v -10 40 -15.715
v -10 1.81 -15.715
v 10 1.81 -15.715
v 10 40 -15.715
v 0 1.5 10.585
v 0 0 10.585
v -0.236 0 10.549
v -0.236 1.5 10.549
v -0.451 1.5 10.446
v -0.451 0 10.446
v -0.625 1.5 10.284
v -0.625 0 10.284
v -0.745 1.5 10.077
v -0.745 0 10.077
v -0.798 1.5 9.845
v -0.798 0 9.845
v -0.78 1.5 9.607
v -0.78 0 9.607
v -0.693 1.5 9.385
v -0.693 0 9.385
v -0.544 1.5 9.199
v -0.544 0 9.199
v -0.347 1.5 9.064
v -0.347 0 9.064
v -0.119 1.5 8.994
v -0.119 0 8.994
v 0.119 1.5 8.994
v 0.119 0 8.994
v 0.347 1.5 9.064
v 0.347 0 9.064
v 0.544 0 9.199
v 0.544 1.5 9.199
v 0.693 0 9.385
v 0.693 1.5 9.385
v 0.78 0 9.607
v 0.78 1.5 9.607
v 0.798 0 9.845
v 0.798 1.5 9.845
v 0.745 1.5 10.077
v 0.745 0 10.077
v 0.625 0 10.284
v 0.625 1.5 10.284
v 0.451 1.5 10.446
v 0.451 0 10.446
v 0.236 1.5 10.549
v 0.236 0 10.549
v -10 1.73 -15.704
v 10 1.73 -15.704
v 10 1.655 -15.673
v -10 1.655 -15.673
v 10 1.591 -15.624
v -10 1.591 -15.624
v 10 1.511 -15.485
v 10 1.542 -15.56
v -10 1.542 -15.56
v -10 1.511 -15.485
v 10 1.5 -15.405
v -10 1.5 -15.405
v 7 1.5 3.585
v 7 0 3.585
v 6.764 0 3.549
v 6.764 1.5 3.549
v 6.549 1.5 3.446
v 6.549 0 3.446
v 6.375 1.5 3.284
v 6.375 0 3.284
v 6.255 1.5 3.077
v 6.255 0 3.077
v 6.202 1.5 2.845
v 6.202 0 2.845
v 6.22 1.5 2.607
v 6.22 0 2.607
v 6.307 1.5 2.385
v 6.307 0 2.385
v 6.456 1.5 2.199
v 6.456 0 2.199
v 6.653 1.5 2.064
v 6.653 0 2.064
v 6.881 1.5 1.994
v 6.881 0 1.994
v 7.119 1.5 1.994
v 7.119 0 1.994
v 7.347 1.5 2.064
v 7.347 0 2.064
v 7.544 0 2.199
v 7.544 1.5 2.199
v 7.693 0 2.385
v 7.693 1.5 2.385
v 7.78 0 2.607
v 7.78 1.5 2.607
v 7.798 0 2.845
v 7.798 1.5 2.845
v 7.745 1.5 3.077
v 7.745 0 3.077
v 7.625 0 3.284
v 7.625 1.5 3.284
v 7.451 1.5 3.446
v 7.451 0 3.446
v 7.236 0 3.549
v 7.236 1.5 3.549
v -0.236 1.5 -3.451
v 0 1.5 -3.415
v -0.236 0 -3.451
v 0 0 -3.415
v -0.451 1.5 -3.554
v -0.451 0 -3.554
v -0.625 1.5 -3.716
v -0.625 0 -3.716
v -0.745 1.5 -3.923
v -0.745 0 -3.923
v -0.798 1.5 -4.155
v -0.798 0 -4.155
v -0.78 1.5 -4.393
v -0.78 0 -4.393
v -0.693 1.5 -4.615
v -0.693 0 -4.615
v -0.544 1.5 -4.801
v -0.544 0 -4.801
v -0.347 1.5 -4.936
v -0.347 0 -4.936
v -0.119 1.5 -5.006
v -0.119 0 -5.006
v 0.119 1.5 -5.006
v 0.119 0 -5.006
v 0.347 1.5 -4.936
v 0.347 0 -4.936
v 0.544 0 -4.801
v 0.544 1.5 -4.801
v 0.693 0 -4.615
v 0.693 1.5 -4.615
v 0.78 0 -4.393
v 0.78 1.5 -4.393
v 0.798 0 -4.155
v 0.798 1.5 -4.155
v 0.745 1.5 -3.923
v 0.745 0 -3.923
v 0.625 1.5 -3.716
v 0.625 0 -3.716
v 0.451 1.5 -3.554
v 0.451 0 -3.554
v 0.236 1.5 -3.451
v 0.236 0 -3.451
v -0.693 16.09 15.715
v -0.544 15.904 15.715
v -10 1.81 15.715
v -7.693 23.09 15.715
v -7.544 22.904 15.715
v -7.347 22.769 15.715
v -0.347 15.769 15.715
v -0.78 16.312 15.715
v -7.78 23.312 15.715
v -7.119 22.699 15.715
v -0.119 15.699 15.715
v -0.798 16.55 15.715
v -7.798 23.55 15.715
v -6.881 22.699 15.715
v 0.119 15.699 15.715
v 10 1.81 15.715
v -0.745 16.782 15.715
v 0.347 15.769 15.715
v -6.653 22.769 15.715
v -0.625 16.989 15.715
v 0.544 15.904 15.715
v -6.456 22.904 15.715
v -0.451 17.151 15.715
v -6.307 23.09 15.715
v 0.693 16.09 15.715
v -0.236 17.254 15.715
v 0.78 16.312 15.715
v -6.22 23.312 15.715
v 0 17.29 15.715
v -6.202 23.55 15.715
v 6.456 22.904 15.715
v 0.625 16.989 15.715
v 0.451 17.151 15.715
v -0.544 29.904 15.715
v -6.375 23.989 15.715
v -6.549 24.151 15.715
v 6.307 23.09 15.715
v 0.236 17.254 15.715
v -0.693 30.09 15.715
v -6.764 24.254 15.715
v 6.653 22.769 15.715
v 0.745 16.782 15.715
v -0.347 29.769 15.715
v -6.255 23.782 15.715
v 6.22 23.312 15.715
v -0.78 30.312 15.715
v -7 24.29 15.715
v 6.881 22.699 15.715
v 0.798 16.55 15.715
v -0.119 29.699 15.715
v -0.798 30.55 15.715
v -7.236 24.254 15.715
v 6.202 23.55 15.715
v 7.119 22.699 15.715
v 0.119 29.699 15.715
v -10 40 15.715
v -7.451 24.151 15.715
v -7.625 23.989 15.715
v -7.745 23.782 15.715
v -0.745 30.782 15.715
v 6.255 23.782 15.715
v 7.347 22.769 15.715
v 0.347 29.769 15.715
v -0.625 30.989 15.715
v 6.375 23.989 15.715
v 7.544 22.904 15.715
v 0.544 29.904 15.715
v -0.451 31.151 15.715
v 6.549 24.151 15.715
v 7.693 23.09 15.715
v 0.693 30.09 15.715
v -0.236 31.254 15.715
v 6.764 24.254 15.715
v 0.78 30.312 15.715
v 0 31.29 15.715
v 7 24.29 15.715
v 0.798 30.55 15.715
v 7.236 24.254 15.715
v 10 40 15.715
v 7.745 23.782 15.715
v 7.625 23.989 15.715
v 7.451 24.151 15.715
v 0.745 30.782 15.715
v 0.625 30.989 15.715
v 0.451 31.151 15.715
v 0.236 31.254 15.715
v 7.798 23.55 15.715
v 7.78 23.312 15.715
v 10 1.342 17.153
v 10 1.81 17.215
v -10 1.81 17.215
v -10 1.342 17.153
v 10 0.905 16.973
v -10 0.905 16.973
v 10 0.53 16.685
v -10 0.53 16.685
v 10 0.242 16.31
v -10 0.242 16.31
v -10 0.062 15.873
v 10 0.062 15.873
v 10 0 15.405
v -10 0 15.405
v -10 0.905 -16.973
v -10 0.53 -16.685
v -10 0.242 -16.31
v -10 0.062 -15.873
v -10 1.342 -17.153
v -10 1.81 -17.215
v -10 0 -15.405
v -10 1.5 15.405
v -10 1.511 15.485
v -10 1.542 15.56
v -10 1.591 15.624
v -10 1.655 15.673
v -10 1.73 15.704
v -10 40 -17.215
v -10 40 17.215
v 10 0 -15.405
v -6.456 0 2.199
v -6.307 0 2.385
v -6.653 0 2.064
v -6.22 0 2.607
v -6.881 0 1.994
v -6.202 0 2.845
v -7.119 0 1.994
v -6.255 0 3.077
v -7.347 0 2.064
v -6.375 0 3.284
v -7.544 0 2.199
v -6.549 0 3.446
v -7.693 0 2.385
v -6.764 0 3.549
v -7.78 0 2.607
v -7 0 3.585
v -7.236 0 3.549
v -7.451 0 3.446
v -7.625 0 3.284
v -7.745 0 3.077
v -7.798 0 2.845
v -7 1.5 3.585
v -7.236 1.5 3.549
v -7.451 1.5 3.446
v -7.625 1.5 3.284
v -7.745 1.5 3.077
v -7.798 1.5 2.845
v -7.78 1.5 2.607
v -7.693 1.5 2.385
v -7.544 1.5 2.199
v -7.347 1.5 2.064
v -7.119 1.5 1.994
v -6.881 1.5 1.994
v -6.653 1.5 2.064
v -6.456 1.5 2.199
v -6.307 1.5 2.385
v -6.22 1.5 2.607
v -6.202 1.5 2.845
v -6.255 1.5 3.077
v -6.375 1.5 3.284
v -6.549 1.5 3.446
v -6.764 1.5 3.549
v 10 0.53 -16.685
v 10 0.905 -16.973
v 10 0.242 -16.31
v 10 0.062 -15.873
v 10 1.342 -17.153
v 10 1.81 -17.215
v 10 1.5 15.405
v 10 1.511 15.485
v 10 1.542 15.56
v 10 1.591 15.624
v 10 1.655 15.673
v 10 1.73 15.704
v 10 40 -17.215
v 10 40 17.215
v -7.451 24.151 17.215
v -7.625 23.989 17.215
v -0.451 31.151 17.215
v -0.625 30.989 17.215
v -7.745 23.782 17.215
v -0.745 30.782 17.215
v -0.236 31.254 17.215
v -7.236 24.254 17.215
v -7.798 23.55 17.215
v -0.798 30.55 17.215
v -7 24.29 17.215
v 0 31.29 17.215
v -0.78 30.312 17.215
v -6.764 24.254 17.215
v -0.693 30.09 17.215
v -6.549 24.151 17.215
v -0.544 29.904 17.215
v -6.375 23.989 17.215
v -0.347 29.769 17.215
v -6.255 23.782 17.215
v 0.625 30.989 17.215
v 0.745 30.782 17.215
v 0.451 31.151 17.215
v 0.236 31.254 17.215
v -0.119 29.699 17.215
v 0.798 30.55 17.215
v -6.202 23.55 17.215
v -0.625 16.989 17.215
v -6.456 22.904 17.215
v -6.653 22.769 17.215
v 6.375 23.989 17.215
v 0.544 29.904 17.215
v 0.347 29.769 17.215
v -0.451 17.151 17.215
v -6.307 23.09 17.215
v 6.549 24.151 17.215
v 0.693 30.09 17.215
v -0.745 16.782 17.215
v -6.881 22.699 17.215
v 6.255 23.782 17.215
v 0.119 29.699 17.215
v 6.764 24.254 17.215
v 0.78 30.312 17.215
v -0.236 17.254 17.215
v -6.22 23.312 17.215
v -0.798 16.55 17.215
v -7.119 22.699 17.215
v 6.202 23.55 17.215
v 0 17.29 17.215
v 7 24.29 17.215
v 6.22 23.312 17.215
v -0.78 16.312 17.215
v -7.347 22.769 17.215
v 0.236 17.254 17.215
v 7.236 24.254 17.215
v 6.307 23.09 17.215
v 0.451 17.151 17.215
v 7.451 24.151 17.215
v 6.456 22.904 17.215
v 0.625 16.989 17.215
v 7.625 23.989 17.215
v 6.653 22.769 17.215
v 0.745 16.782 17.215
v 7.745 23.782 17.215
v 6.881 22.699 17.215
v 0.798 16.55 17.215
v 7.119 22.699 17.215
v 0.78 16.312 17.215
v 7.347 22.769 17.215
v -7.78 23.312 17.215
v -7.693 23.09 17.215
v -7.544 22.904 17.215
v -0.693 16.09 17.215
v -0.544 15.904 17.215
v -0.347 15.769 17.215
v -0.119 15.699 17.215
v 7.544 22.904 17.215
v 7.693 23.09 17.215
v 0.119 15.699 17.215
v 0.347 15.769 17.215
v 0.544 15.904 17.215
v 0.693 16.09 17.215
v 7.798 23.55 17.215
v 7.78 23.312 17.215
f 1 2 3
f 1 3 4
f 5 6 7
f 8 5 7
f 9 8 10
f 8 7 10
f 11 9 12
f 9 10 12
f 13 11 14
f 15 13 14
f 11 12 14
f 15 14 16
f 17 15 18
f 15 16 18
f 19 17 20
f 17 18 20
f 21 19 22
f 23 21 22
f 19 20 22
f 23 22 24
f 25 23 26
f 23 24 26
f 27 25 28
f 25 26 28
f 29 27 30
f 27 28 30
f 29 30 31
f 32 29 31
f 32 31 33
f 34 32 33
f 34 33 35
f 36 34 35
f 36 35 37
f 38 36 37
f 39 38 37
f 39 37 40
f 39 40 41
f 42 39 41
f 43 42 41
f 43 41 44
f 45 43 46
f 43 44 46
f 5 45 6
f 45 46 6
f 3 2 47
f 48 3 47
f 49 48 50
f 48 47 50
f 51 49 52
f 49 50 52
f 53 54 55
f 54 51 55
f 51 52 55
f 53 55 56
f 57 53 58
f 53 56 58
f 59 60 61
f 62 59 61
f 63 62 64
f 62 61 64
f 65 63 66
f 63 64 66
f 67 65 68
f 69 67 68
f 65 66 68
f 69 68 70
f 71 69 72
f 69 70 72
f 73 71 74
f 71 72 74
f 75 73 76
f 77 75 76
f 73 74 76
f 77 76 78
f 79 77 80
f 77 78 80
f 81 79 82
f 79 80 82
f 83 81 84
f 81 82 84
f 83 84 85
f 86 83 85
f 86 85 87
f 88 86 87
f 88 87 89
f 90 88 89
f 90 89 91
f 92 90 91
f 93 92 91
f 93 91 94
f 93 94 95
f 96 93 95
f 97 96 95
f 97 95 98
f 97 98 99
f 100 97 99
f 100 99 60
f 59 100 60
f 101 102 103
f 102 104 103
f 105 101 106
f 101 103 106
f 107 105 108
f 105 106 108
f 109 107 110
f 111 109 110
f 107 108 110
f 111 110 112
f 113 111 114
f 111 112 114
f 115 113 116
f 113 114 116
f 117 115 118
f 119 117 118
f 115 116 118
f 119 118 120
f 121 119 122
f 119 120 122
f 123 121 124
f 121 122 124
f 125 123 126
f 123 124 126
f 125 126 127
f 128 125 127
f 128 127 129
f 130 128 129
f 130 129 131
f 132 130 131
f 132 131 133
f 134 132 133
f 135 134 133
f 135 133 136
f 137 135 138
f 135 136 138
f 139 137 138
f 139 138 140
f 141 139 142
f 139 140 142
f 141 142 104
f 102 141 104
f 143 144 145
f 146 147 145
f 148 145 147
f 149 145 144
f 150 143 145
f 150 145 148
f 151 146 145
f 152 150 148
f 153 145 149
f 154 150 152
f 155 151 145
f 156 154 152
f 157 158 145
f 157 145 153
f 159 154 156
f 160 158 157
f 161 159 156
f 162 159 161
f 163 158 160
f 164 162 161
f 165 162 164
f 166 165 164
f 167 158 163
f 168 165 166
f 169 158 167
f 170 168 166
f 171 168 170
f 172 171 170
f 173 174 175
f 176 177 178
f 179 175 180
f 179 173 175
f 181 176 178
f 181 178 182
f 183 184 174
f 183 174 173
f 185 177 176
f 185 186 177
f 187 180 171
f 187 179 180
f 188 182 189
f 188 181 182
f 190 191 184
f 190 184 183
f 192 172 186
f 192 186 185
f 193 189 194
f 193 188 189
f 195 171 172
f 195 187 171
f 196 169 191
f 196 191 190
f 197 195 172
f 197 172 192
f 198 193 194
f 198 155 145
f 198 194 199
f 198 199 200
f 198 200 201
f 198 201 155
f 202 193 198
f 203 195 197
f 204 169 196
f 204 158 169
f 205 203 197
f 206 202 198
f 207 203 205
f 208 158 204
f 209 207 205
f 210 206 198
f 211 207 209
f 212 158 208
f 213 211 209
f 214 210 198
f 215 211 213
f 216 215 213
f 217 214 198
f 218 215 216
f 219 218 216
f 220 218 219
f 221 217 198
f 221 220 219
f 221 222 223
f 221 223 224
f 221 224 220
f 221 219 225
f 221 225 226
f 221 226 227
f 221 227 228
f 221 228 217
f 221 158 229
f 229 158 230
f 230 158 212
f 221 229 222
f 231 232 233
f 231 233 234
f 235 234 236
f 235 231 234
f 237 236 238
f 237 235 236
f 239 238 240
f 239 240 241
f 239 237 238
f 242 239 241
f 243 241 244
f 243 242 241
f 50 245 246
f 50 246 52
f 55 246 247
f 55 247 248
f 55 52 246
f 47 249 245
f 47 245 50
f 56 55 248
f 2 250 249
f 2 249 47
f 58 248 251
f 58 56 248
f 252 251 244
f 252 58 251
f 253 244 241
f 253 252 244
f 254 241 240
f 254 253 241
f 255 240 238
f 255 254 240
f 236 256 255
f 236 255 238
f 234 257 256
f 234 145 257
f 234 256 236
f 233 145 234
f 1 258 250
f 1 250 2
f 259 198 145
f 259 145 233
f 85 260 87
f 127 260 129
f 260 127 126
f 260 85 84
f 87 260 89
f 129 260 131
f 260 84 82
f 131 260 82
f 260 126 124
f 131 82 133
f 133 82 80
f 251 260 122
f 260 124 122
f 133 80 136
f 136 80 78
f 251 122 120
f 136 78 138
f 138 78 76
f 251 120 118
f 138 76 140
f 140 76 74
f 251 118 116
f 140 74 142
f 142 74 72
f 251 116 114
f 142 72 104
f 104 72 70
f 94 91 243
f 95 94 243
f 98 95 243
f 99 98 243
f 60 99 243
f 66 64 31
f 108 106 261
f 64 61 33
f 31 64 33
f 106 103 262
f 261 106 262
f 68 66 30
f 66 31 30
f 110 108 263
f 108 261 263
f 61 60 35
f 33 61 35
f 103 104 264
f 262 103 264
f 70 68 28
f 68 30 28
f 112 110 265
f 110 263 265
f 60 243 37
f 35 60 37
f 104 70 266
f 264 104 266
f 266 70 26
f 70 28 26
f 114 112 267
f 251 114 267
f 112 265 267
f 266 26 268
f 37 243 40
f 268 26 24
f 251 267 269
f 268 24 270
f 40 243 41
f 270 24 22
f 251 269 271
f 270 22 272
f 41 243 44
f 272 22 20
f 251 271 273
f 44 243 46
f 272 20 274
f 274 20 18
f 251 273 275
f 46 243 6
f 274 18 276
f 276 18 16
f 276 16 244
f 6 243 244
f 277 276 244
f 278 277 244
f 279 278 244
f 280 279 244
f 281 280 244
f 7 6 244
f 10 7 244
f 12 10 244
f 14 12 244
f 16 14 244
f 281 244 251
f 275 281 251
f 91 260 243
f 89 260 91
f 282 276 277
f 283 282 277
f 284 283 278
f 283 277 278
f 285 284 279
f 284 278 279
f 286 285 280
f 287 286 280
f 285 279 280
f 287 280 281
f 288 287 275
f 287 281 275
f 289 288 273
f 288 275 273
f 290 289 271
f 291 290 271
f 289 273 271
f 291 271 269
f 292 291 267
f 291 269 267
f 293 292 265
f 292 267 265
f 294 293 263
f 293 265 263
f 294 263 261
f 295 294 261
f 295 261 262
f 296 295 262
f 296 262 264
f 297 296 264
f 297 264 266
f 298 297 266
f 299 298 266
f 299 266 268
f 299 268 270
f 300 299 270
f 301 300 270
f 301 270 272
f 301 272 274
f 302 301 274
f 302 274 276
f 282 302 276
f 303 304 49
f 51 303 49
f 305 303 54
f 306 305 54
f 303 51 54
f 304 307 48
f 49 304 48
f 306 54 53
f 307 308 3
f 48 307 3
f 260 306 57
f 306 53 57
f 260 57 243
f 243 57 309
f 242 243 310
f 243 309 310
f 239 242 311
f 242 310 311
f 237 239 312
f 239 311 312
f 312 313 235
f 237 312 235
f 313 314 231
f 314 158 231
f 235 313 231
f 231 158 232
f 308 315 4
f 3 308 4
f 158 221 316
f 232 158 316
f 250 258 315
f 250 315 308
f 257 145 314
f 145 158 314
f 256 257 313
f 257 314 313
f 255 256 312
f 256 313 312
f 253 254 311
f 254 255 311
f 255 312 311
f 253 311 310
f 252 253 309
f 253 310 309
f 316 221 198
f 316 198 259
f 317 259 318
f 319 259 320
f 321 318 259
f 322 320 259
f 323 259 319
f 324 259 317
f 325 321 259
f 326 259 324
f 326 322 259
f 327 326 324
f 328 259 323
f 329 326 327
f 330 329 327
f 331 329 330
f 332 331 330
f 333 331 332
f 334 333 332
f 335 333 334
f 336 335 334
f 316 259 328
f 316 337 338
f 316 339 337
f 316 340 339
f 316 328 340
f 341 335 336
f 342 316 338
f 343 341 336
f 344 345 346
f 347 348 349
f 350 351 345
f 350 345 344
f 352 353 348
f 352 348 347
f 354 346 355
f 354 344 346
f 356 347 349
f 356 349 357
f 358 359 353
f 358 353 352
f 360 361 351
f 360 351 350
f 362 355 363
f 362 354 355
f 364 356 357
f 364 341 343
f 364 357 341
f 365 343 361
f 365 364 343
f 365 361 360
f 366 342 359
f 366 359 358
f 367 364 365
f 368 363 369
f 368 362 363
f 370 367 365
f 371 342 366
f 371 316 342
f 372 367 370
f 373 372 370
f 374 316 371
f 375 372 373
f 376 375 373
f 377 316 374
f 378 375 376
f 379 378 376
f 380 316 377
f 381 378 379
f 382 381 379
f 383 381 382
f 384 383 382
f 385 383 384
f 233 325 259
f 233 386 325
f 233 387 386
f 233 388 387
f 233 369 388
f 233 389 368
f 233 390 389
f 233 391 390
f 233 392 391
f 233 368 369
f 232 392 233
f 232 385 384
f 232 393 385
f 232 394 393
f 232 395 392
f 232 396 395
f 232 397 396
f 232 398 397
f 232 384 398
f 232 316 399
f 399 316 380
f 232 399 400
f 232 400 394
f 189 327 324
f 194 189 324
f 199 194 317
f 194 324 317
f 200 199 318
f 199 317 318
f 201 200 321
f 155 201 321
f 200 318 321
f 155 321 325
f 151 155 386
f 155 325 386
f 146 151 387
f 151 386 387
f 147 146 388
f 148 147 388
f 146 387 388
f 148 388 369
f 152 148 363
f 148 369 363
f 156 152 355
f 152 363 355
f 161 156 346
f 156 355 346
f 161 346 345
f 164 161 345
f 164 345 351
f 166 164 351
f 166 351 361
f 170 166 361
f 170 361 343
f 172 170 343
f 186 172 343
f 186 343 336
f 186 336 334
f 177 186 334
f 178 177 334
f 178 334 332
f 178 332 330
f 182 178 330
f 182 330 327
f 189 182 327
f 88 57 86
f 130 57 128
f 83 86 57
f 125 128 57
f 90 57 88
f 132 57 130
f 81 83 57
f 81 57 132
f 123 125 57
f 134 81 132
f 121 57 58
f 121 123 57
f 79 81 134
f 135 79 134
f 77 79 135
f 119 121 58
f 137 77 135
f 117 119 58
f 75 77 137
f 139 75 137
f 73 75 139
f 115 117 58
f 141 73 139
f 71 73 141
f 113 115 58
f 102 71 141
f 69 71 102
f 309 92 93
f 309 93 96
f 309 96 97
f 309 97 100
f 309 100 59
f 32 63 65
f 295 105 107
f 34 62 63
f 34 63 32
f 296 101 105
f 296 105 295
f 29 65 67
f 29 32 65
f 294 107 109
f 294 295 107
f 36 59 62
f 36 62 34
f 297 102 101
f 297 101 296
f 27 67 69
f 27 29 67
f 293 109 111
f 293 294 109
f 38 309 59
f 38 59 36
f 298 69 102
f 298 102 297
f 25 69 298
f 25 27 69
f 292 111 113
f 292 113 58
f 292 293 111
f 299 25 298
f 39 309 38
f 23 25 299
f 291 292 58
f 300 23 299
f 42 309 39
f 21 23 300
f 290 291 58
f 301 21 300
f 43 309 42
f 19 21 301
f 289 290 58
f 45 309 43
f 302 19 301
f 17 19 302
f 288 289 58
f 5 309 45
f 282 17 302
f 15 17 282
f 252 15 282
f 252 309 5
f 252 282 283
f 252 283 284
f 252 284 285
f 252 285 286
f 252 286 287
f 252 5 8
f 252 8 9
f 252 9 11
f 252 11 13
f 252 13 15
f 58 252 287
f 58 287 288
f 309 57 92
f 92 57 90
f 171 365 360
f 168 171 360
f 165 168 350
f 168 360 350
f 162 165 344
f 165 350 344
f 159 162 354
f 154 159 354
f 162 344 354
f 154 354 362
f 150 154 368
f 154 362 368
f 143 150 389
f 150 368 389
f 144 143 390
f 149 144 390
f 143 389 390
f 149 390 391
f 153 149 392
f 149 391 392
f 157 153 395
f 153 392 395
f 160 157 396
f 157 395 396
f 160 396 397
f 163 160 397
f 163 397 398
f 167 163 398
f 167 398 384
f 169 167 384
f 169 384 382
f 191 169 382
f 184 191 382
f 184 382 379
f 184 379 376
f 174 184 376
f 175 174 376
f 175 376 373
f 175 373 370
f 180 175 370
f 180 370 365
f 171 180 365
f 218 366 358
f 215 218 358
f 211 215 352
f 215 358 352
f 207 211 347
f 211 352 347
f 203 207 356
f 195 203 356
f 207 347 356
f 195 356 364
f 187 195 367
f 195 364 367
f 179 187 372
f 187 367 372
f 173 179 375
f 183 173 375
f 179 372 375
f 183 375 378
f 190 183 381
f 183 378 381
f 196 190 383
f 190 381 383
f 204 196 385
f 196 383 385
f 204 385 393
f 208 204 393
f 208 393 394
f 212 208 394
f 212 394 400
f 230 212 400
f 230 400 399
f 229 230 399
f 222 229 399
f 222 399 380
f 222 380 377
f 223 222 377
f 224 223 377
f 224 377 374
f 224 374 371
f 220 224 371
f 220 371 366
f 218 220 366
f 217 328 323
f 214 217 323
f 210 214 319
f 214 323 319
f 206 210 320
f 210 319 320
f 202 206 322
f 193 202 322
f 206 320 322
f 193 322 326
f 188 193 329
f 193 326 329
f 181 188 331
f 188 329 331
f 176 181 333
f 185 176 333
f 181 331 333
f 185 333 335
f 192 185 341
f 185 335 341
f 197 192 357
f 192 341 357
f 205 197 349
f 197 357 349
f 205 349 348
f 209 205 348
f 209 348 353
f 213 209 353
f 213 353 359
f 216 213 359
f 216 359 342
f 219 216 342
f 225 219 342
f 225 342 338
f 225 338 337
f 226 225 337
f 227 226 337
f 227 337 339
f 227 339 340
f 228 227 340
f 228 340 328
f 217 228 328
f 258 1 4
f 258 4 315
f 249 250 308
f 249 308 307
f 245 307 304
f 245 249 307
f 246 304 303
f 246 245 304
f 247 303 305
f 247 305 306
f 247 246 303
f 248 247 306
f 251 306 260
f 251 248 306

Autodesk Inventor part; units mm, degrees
ref_plane "YZ Plane" through (0, 0, 0) normal (1, 0, 0) x (0, 1, 0)
ref_plane "XZ Plane" through (0, 0, 0) normal (0, 1, 0) x (-1, 0, 0)
ref_plane "XY Plane" through (0, 0, 0) normal (0, 0, 1) x (1, 0, 0)
sketch "Sketch1" plane through (0, 0, 0) normal (0, 1, 0) x (-1, 0, 0)
  line L0 (10, -15.715) -> (-10, -15.715)
  line L1 (-10, -15.715) -> (-10, 15.715)
  line L2 (-10, 15.715) -> (10, 15.715)
  line L3 (10, 15.715) -> (10, -15.715)
  point P0 (0, 0)
  dimension "d0" = 20
  dimension "d1" = 31.43
  dimension "d2" = 10
  dimension "d3" = 15.715
extrude "Plate1" add sketch "Sketch1" along normal blind 1.5
sketch "Sketch2" plane through (10, 0, 17.215) normal (0, 0, -1) x (-1, 0, 0)
  line L0 (20, 0) -> (0, 0)
  line L1 (0, 0) -> (0, 40)
  line L2 (0, 40) -> (20, 40)
  line L3 (20, 40) -> (20, 0)
edge flange "Flange1" height 40 angle 90 thickness 1.5 bend radius 0.31 thickness toward (0, 0, -1) relief tear relief width 1.5 relief depth 0.75 edges at (0, 1.5, 15.715) wall of the first edge with corners at (-10, 0, 17.215) (10, 0, 17.215) (10, 40, 17.215) (-10, 40, 17.215)
bend "Bend1"
corner "Corner1"
sketch "Sketch3" plane through (-10, 0, -17.215) normal (0, 0, 1) x (1, 0, 0)
  line L0 (20, 0) -> (0, 0)
  line L1 (0, 0) -> (0, 40)
  line L2 (0, 40) -> (20, 40)
  line L3 (20, 40) -> (20, 0)
edge flange "Flange2" height 40 angle 90 thickness 1.5 bend radius 0.31 thickness toward (0, 0, 1) relief tear relief width 1.5 relief depth 0.75 edges at (0, 1.5, -15.715) wall of the first edge with corners at (10, 0, -17.215) (-10, 0, -17.215) (-10, 40, -17.215) (10, 40, -17.215)
bend "Bend2"
corner "Corner2"
sketch "Sketch4" plane through (10, 40, 15.715) normal (0, 0, -1) x (-1, 0, 0)
  line L0 (30.46, -23.2265) -> (30.46, -24.7935) projected
  line L1 (38.57, -15.71) -> (38.57, -17.31) projected
  circle A0 centre (3, -16.51) radius 0.7835 projected
  circle A1 centre (10, -9.51) radius 0.7835 projected
  line L2 (38.57, -15.71) -> (38.57, -17.31) projected
  line L3 (38.57, -15.71) -> (38.57, -17.31) projected
  line L4 (37.07, -17.31) -> (37.07, -15.71) projected
  line L5 (30.46, -23.2265) -> (30.46, -24.7935) projected
  circle A2 centre (10, -23.51) radius 0.7835 projected
  circle A3 centre (3, -16.51) radius 0.7835 projected
  circle A4 centre (17, -16.51) radius 0.7835 projected
  circle A5 centre (10, -9.51) radius 0.7835 projected
  point P0 (10, -40)
hole "Hole1" at (0, 16.49, 15.715) at (-7, 23.49, 15.715) at (0, 30.49, 15.715) at (7, 23.49, 15.715) direction (0, 0, 1) diameter 1.6 depth 1.5
sketch "Sketch5" plane through (0, 1.5, 0) normal (0, 1, 0) x (1, 0, 0)
  circle A0 centre (-7, -2.785) radius 0.7835 projected
  circle A1 centre (0, -9.785) radius 0.7835 projected
  circle A2 centre (7, -2.785) radius 0.7835 projected
  circle A3 centre (0, 4.215) radius 0.7835 projected
  point P0 (0, 0)
hole "Hole2" at (-7, 1.5, 2.785) at (0, 1.5, 9.785) at (7, 1.5, 2.785) at (0, 1.5, -4.215) direction (0, -1, 0) diameter 1.6 depth 1.5
equation "\"d30\" = Thickness"
equation "\"d37\" = Thickness"
equation "\"d4\" = Thickness"
equation "\"d5\" = BendReliefWidth"
equation "\"d6\" = BendReliefDepth"
equation "\"d7\" = MinimumRemnant"
equation "\"d8\" = TransitionRadius"
equation "\"d11\" = BendRadius"
equation "\"d12\" = CornerReliefSize"
equation "\"d13\" = GapSize"
equation "\"d14\" = JacobiRadiusSize"
equation "\"d15\" = BendReliefWidth"
equation "\"d16\" = BendReliefDepth"
equation "\"d17\" = MinimumRemnant"
equation "\"d18\" = TransitionRadius"
equation "\"d21\" = BendRadius"
equation "\"d22\" = CornerReliefSize"
equation "\"d23\" = GapSize"
equation "\"d24\" = JacobiRadiusSize"
equation "\"BendReliefWidth\" = Thickness"
equation "\"BendReliefDepth\" = 0.5 * Thickness"
equation "\"CornerReliefSize\" = 4 * Thickness"
equation "\"MinimumRemnant\" = 2 * Thickness"
equation "\"TransitionRadius\" = BendRadius"
equation "\"JacobiRadiusSize\" = BendRadius"
equation "\"GapSize\" = Thickness"
equation "\"Thickness\" = 1.5"
equation "\"BendRadius\" = 0.31"
properties part number "axis_7_top_frame" material "Aluminum 6061-AHC"
